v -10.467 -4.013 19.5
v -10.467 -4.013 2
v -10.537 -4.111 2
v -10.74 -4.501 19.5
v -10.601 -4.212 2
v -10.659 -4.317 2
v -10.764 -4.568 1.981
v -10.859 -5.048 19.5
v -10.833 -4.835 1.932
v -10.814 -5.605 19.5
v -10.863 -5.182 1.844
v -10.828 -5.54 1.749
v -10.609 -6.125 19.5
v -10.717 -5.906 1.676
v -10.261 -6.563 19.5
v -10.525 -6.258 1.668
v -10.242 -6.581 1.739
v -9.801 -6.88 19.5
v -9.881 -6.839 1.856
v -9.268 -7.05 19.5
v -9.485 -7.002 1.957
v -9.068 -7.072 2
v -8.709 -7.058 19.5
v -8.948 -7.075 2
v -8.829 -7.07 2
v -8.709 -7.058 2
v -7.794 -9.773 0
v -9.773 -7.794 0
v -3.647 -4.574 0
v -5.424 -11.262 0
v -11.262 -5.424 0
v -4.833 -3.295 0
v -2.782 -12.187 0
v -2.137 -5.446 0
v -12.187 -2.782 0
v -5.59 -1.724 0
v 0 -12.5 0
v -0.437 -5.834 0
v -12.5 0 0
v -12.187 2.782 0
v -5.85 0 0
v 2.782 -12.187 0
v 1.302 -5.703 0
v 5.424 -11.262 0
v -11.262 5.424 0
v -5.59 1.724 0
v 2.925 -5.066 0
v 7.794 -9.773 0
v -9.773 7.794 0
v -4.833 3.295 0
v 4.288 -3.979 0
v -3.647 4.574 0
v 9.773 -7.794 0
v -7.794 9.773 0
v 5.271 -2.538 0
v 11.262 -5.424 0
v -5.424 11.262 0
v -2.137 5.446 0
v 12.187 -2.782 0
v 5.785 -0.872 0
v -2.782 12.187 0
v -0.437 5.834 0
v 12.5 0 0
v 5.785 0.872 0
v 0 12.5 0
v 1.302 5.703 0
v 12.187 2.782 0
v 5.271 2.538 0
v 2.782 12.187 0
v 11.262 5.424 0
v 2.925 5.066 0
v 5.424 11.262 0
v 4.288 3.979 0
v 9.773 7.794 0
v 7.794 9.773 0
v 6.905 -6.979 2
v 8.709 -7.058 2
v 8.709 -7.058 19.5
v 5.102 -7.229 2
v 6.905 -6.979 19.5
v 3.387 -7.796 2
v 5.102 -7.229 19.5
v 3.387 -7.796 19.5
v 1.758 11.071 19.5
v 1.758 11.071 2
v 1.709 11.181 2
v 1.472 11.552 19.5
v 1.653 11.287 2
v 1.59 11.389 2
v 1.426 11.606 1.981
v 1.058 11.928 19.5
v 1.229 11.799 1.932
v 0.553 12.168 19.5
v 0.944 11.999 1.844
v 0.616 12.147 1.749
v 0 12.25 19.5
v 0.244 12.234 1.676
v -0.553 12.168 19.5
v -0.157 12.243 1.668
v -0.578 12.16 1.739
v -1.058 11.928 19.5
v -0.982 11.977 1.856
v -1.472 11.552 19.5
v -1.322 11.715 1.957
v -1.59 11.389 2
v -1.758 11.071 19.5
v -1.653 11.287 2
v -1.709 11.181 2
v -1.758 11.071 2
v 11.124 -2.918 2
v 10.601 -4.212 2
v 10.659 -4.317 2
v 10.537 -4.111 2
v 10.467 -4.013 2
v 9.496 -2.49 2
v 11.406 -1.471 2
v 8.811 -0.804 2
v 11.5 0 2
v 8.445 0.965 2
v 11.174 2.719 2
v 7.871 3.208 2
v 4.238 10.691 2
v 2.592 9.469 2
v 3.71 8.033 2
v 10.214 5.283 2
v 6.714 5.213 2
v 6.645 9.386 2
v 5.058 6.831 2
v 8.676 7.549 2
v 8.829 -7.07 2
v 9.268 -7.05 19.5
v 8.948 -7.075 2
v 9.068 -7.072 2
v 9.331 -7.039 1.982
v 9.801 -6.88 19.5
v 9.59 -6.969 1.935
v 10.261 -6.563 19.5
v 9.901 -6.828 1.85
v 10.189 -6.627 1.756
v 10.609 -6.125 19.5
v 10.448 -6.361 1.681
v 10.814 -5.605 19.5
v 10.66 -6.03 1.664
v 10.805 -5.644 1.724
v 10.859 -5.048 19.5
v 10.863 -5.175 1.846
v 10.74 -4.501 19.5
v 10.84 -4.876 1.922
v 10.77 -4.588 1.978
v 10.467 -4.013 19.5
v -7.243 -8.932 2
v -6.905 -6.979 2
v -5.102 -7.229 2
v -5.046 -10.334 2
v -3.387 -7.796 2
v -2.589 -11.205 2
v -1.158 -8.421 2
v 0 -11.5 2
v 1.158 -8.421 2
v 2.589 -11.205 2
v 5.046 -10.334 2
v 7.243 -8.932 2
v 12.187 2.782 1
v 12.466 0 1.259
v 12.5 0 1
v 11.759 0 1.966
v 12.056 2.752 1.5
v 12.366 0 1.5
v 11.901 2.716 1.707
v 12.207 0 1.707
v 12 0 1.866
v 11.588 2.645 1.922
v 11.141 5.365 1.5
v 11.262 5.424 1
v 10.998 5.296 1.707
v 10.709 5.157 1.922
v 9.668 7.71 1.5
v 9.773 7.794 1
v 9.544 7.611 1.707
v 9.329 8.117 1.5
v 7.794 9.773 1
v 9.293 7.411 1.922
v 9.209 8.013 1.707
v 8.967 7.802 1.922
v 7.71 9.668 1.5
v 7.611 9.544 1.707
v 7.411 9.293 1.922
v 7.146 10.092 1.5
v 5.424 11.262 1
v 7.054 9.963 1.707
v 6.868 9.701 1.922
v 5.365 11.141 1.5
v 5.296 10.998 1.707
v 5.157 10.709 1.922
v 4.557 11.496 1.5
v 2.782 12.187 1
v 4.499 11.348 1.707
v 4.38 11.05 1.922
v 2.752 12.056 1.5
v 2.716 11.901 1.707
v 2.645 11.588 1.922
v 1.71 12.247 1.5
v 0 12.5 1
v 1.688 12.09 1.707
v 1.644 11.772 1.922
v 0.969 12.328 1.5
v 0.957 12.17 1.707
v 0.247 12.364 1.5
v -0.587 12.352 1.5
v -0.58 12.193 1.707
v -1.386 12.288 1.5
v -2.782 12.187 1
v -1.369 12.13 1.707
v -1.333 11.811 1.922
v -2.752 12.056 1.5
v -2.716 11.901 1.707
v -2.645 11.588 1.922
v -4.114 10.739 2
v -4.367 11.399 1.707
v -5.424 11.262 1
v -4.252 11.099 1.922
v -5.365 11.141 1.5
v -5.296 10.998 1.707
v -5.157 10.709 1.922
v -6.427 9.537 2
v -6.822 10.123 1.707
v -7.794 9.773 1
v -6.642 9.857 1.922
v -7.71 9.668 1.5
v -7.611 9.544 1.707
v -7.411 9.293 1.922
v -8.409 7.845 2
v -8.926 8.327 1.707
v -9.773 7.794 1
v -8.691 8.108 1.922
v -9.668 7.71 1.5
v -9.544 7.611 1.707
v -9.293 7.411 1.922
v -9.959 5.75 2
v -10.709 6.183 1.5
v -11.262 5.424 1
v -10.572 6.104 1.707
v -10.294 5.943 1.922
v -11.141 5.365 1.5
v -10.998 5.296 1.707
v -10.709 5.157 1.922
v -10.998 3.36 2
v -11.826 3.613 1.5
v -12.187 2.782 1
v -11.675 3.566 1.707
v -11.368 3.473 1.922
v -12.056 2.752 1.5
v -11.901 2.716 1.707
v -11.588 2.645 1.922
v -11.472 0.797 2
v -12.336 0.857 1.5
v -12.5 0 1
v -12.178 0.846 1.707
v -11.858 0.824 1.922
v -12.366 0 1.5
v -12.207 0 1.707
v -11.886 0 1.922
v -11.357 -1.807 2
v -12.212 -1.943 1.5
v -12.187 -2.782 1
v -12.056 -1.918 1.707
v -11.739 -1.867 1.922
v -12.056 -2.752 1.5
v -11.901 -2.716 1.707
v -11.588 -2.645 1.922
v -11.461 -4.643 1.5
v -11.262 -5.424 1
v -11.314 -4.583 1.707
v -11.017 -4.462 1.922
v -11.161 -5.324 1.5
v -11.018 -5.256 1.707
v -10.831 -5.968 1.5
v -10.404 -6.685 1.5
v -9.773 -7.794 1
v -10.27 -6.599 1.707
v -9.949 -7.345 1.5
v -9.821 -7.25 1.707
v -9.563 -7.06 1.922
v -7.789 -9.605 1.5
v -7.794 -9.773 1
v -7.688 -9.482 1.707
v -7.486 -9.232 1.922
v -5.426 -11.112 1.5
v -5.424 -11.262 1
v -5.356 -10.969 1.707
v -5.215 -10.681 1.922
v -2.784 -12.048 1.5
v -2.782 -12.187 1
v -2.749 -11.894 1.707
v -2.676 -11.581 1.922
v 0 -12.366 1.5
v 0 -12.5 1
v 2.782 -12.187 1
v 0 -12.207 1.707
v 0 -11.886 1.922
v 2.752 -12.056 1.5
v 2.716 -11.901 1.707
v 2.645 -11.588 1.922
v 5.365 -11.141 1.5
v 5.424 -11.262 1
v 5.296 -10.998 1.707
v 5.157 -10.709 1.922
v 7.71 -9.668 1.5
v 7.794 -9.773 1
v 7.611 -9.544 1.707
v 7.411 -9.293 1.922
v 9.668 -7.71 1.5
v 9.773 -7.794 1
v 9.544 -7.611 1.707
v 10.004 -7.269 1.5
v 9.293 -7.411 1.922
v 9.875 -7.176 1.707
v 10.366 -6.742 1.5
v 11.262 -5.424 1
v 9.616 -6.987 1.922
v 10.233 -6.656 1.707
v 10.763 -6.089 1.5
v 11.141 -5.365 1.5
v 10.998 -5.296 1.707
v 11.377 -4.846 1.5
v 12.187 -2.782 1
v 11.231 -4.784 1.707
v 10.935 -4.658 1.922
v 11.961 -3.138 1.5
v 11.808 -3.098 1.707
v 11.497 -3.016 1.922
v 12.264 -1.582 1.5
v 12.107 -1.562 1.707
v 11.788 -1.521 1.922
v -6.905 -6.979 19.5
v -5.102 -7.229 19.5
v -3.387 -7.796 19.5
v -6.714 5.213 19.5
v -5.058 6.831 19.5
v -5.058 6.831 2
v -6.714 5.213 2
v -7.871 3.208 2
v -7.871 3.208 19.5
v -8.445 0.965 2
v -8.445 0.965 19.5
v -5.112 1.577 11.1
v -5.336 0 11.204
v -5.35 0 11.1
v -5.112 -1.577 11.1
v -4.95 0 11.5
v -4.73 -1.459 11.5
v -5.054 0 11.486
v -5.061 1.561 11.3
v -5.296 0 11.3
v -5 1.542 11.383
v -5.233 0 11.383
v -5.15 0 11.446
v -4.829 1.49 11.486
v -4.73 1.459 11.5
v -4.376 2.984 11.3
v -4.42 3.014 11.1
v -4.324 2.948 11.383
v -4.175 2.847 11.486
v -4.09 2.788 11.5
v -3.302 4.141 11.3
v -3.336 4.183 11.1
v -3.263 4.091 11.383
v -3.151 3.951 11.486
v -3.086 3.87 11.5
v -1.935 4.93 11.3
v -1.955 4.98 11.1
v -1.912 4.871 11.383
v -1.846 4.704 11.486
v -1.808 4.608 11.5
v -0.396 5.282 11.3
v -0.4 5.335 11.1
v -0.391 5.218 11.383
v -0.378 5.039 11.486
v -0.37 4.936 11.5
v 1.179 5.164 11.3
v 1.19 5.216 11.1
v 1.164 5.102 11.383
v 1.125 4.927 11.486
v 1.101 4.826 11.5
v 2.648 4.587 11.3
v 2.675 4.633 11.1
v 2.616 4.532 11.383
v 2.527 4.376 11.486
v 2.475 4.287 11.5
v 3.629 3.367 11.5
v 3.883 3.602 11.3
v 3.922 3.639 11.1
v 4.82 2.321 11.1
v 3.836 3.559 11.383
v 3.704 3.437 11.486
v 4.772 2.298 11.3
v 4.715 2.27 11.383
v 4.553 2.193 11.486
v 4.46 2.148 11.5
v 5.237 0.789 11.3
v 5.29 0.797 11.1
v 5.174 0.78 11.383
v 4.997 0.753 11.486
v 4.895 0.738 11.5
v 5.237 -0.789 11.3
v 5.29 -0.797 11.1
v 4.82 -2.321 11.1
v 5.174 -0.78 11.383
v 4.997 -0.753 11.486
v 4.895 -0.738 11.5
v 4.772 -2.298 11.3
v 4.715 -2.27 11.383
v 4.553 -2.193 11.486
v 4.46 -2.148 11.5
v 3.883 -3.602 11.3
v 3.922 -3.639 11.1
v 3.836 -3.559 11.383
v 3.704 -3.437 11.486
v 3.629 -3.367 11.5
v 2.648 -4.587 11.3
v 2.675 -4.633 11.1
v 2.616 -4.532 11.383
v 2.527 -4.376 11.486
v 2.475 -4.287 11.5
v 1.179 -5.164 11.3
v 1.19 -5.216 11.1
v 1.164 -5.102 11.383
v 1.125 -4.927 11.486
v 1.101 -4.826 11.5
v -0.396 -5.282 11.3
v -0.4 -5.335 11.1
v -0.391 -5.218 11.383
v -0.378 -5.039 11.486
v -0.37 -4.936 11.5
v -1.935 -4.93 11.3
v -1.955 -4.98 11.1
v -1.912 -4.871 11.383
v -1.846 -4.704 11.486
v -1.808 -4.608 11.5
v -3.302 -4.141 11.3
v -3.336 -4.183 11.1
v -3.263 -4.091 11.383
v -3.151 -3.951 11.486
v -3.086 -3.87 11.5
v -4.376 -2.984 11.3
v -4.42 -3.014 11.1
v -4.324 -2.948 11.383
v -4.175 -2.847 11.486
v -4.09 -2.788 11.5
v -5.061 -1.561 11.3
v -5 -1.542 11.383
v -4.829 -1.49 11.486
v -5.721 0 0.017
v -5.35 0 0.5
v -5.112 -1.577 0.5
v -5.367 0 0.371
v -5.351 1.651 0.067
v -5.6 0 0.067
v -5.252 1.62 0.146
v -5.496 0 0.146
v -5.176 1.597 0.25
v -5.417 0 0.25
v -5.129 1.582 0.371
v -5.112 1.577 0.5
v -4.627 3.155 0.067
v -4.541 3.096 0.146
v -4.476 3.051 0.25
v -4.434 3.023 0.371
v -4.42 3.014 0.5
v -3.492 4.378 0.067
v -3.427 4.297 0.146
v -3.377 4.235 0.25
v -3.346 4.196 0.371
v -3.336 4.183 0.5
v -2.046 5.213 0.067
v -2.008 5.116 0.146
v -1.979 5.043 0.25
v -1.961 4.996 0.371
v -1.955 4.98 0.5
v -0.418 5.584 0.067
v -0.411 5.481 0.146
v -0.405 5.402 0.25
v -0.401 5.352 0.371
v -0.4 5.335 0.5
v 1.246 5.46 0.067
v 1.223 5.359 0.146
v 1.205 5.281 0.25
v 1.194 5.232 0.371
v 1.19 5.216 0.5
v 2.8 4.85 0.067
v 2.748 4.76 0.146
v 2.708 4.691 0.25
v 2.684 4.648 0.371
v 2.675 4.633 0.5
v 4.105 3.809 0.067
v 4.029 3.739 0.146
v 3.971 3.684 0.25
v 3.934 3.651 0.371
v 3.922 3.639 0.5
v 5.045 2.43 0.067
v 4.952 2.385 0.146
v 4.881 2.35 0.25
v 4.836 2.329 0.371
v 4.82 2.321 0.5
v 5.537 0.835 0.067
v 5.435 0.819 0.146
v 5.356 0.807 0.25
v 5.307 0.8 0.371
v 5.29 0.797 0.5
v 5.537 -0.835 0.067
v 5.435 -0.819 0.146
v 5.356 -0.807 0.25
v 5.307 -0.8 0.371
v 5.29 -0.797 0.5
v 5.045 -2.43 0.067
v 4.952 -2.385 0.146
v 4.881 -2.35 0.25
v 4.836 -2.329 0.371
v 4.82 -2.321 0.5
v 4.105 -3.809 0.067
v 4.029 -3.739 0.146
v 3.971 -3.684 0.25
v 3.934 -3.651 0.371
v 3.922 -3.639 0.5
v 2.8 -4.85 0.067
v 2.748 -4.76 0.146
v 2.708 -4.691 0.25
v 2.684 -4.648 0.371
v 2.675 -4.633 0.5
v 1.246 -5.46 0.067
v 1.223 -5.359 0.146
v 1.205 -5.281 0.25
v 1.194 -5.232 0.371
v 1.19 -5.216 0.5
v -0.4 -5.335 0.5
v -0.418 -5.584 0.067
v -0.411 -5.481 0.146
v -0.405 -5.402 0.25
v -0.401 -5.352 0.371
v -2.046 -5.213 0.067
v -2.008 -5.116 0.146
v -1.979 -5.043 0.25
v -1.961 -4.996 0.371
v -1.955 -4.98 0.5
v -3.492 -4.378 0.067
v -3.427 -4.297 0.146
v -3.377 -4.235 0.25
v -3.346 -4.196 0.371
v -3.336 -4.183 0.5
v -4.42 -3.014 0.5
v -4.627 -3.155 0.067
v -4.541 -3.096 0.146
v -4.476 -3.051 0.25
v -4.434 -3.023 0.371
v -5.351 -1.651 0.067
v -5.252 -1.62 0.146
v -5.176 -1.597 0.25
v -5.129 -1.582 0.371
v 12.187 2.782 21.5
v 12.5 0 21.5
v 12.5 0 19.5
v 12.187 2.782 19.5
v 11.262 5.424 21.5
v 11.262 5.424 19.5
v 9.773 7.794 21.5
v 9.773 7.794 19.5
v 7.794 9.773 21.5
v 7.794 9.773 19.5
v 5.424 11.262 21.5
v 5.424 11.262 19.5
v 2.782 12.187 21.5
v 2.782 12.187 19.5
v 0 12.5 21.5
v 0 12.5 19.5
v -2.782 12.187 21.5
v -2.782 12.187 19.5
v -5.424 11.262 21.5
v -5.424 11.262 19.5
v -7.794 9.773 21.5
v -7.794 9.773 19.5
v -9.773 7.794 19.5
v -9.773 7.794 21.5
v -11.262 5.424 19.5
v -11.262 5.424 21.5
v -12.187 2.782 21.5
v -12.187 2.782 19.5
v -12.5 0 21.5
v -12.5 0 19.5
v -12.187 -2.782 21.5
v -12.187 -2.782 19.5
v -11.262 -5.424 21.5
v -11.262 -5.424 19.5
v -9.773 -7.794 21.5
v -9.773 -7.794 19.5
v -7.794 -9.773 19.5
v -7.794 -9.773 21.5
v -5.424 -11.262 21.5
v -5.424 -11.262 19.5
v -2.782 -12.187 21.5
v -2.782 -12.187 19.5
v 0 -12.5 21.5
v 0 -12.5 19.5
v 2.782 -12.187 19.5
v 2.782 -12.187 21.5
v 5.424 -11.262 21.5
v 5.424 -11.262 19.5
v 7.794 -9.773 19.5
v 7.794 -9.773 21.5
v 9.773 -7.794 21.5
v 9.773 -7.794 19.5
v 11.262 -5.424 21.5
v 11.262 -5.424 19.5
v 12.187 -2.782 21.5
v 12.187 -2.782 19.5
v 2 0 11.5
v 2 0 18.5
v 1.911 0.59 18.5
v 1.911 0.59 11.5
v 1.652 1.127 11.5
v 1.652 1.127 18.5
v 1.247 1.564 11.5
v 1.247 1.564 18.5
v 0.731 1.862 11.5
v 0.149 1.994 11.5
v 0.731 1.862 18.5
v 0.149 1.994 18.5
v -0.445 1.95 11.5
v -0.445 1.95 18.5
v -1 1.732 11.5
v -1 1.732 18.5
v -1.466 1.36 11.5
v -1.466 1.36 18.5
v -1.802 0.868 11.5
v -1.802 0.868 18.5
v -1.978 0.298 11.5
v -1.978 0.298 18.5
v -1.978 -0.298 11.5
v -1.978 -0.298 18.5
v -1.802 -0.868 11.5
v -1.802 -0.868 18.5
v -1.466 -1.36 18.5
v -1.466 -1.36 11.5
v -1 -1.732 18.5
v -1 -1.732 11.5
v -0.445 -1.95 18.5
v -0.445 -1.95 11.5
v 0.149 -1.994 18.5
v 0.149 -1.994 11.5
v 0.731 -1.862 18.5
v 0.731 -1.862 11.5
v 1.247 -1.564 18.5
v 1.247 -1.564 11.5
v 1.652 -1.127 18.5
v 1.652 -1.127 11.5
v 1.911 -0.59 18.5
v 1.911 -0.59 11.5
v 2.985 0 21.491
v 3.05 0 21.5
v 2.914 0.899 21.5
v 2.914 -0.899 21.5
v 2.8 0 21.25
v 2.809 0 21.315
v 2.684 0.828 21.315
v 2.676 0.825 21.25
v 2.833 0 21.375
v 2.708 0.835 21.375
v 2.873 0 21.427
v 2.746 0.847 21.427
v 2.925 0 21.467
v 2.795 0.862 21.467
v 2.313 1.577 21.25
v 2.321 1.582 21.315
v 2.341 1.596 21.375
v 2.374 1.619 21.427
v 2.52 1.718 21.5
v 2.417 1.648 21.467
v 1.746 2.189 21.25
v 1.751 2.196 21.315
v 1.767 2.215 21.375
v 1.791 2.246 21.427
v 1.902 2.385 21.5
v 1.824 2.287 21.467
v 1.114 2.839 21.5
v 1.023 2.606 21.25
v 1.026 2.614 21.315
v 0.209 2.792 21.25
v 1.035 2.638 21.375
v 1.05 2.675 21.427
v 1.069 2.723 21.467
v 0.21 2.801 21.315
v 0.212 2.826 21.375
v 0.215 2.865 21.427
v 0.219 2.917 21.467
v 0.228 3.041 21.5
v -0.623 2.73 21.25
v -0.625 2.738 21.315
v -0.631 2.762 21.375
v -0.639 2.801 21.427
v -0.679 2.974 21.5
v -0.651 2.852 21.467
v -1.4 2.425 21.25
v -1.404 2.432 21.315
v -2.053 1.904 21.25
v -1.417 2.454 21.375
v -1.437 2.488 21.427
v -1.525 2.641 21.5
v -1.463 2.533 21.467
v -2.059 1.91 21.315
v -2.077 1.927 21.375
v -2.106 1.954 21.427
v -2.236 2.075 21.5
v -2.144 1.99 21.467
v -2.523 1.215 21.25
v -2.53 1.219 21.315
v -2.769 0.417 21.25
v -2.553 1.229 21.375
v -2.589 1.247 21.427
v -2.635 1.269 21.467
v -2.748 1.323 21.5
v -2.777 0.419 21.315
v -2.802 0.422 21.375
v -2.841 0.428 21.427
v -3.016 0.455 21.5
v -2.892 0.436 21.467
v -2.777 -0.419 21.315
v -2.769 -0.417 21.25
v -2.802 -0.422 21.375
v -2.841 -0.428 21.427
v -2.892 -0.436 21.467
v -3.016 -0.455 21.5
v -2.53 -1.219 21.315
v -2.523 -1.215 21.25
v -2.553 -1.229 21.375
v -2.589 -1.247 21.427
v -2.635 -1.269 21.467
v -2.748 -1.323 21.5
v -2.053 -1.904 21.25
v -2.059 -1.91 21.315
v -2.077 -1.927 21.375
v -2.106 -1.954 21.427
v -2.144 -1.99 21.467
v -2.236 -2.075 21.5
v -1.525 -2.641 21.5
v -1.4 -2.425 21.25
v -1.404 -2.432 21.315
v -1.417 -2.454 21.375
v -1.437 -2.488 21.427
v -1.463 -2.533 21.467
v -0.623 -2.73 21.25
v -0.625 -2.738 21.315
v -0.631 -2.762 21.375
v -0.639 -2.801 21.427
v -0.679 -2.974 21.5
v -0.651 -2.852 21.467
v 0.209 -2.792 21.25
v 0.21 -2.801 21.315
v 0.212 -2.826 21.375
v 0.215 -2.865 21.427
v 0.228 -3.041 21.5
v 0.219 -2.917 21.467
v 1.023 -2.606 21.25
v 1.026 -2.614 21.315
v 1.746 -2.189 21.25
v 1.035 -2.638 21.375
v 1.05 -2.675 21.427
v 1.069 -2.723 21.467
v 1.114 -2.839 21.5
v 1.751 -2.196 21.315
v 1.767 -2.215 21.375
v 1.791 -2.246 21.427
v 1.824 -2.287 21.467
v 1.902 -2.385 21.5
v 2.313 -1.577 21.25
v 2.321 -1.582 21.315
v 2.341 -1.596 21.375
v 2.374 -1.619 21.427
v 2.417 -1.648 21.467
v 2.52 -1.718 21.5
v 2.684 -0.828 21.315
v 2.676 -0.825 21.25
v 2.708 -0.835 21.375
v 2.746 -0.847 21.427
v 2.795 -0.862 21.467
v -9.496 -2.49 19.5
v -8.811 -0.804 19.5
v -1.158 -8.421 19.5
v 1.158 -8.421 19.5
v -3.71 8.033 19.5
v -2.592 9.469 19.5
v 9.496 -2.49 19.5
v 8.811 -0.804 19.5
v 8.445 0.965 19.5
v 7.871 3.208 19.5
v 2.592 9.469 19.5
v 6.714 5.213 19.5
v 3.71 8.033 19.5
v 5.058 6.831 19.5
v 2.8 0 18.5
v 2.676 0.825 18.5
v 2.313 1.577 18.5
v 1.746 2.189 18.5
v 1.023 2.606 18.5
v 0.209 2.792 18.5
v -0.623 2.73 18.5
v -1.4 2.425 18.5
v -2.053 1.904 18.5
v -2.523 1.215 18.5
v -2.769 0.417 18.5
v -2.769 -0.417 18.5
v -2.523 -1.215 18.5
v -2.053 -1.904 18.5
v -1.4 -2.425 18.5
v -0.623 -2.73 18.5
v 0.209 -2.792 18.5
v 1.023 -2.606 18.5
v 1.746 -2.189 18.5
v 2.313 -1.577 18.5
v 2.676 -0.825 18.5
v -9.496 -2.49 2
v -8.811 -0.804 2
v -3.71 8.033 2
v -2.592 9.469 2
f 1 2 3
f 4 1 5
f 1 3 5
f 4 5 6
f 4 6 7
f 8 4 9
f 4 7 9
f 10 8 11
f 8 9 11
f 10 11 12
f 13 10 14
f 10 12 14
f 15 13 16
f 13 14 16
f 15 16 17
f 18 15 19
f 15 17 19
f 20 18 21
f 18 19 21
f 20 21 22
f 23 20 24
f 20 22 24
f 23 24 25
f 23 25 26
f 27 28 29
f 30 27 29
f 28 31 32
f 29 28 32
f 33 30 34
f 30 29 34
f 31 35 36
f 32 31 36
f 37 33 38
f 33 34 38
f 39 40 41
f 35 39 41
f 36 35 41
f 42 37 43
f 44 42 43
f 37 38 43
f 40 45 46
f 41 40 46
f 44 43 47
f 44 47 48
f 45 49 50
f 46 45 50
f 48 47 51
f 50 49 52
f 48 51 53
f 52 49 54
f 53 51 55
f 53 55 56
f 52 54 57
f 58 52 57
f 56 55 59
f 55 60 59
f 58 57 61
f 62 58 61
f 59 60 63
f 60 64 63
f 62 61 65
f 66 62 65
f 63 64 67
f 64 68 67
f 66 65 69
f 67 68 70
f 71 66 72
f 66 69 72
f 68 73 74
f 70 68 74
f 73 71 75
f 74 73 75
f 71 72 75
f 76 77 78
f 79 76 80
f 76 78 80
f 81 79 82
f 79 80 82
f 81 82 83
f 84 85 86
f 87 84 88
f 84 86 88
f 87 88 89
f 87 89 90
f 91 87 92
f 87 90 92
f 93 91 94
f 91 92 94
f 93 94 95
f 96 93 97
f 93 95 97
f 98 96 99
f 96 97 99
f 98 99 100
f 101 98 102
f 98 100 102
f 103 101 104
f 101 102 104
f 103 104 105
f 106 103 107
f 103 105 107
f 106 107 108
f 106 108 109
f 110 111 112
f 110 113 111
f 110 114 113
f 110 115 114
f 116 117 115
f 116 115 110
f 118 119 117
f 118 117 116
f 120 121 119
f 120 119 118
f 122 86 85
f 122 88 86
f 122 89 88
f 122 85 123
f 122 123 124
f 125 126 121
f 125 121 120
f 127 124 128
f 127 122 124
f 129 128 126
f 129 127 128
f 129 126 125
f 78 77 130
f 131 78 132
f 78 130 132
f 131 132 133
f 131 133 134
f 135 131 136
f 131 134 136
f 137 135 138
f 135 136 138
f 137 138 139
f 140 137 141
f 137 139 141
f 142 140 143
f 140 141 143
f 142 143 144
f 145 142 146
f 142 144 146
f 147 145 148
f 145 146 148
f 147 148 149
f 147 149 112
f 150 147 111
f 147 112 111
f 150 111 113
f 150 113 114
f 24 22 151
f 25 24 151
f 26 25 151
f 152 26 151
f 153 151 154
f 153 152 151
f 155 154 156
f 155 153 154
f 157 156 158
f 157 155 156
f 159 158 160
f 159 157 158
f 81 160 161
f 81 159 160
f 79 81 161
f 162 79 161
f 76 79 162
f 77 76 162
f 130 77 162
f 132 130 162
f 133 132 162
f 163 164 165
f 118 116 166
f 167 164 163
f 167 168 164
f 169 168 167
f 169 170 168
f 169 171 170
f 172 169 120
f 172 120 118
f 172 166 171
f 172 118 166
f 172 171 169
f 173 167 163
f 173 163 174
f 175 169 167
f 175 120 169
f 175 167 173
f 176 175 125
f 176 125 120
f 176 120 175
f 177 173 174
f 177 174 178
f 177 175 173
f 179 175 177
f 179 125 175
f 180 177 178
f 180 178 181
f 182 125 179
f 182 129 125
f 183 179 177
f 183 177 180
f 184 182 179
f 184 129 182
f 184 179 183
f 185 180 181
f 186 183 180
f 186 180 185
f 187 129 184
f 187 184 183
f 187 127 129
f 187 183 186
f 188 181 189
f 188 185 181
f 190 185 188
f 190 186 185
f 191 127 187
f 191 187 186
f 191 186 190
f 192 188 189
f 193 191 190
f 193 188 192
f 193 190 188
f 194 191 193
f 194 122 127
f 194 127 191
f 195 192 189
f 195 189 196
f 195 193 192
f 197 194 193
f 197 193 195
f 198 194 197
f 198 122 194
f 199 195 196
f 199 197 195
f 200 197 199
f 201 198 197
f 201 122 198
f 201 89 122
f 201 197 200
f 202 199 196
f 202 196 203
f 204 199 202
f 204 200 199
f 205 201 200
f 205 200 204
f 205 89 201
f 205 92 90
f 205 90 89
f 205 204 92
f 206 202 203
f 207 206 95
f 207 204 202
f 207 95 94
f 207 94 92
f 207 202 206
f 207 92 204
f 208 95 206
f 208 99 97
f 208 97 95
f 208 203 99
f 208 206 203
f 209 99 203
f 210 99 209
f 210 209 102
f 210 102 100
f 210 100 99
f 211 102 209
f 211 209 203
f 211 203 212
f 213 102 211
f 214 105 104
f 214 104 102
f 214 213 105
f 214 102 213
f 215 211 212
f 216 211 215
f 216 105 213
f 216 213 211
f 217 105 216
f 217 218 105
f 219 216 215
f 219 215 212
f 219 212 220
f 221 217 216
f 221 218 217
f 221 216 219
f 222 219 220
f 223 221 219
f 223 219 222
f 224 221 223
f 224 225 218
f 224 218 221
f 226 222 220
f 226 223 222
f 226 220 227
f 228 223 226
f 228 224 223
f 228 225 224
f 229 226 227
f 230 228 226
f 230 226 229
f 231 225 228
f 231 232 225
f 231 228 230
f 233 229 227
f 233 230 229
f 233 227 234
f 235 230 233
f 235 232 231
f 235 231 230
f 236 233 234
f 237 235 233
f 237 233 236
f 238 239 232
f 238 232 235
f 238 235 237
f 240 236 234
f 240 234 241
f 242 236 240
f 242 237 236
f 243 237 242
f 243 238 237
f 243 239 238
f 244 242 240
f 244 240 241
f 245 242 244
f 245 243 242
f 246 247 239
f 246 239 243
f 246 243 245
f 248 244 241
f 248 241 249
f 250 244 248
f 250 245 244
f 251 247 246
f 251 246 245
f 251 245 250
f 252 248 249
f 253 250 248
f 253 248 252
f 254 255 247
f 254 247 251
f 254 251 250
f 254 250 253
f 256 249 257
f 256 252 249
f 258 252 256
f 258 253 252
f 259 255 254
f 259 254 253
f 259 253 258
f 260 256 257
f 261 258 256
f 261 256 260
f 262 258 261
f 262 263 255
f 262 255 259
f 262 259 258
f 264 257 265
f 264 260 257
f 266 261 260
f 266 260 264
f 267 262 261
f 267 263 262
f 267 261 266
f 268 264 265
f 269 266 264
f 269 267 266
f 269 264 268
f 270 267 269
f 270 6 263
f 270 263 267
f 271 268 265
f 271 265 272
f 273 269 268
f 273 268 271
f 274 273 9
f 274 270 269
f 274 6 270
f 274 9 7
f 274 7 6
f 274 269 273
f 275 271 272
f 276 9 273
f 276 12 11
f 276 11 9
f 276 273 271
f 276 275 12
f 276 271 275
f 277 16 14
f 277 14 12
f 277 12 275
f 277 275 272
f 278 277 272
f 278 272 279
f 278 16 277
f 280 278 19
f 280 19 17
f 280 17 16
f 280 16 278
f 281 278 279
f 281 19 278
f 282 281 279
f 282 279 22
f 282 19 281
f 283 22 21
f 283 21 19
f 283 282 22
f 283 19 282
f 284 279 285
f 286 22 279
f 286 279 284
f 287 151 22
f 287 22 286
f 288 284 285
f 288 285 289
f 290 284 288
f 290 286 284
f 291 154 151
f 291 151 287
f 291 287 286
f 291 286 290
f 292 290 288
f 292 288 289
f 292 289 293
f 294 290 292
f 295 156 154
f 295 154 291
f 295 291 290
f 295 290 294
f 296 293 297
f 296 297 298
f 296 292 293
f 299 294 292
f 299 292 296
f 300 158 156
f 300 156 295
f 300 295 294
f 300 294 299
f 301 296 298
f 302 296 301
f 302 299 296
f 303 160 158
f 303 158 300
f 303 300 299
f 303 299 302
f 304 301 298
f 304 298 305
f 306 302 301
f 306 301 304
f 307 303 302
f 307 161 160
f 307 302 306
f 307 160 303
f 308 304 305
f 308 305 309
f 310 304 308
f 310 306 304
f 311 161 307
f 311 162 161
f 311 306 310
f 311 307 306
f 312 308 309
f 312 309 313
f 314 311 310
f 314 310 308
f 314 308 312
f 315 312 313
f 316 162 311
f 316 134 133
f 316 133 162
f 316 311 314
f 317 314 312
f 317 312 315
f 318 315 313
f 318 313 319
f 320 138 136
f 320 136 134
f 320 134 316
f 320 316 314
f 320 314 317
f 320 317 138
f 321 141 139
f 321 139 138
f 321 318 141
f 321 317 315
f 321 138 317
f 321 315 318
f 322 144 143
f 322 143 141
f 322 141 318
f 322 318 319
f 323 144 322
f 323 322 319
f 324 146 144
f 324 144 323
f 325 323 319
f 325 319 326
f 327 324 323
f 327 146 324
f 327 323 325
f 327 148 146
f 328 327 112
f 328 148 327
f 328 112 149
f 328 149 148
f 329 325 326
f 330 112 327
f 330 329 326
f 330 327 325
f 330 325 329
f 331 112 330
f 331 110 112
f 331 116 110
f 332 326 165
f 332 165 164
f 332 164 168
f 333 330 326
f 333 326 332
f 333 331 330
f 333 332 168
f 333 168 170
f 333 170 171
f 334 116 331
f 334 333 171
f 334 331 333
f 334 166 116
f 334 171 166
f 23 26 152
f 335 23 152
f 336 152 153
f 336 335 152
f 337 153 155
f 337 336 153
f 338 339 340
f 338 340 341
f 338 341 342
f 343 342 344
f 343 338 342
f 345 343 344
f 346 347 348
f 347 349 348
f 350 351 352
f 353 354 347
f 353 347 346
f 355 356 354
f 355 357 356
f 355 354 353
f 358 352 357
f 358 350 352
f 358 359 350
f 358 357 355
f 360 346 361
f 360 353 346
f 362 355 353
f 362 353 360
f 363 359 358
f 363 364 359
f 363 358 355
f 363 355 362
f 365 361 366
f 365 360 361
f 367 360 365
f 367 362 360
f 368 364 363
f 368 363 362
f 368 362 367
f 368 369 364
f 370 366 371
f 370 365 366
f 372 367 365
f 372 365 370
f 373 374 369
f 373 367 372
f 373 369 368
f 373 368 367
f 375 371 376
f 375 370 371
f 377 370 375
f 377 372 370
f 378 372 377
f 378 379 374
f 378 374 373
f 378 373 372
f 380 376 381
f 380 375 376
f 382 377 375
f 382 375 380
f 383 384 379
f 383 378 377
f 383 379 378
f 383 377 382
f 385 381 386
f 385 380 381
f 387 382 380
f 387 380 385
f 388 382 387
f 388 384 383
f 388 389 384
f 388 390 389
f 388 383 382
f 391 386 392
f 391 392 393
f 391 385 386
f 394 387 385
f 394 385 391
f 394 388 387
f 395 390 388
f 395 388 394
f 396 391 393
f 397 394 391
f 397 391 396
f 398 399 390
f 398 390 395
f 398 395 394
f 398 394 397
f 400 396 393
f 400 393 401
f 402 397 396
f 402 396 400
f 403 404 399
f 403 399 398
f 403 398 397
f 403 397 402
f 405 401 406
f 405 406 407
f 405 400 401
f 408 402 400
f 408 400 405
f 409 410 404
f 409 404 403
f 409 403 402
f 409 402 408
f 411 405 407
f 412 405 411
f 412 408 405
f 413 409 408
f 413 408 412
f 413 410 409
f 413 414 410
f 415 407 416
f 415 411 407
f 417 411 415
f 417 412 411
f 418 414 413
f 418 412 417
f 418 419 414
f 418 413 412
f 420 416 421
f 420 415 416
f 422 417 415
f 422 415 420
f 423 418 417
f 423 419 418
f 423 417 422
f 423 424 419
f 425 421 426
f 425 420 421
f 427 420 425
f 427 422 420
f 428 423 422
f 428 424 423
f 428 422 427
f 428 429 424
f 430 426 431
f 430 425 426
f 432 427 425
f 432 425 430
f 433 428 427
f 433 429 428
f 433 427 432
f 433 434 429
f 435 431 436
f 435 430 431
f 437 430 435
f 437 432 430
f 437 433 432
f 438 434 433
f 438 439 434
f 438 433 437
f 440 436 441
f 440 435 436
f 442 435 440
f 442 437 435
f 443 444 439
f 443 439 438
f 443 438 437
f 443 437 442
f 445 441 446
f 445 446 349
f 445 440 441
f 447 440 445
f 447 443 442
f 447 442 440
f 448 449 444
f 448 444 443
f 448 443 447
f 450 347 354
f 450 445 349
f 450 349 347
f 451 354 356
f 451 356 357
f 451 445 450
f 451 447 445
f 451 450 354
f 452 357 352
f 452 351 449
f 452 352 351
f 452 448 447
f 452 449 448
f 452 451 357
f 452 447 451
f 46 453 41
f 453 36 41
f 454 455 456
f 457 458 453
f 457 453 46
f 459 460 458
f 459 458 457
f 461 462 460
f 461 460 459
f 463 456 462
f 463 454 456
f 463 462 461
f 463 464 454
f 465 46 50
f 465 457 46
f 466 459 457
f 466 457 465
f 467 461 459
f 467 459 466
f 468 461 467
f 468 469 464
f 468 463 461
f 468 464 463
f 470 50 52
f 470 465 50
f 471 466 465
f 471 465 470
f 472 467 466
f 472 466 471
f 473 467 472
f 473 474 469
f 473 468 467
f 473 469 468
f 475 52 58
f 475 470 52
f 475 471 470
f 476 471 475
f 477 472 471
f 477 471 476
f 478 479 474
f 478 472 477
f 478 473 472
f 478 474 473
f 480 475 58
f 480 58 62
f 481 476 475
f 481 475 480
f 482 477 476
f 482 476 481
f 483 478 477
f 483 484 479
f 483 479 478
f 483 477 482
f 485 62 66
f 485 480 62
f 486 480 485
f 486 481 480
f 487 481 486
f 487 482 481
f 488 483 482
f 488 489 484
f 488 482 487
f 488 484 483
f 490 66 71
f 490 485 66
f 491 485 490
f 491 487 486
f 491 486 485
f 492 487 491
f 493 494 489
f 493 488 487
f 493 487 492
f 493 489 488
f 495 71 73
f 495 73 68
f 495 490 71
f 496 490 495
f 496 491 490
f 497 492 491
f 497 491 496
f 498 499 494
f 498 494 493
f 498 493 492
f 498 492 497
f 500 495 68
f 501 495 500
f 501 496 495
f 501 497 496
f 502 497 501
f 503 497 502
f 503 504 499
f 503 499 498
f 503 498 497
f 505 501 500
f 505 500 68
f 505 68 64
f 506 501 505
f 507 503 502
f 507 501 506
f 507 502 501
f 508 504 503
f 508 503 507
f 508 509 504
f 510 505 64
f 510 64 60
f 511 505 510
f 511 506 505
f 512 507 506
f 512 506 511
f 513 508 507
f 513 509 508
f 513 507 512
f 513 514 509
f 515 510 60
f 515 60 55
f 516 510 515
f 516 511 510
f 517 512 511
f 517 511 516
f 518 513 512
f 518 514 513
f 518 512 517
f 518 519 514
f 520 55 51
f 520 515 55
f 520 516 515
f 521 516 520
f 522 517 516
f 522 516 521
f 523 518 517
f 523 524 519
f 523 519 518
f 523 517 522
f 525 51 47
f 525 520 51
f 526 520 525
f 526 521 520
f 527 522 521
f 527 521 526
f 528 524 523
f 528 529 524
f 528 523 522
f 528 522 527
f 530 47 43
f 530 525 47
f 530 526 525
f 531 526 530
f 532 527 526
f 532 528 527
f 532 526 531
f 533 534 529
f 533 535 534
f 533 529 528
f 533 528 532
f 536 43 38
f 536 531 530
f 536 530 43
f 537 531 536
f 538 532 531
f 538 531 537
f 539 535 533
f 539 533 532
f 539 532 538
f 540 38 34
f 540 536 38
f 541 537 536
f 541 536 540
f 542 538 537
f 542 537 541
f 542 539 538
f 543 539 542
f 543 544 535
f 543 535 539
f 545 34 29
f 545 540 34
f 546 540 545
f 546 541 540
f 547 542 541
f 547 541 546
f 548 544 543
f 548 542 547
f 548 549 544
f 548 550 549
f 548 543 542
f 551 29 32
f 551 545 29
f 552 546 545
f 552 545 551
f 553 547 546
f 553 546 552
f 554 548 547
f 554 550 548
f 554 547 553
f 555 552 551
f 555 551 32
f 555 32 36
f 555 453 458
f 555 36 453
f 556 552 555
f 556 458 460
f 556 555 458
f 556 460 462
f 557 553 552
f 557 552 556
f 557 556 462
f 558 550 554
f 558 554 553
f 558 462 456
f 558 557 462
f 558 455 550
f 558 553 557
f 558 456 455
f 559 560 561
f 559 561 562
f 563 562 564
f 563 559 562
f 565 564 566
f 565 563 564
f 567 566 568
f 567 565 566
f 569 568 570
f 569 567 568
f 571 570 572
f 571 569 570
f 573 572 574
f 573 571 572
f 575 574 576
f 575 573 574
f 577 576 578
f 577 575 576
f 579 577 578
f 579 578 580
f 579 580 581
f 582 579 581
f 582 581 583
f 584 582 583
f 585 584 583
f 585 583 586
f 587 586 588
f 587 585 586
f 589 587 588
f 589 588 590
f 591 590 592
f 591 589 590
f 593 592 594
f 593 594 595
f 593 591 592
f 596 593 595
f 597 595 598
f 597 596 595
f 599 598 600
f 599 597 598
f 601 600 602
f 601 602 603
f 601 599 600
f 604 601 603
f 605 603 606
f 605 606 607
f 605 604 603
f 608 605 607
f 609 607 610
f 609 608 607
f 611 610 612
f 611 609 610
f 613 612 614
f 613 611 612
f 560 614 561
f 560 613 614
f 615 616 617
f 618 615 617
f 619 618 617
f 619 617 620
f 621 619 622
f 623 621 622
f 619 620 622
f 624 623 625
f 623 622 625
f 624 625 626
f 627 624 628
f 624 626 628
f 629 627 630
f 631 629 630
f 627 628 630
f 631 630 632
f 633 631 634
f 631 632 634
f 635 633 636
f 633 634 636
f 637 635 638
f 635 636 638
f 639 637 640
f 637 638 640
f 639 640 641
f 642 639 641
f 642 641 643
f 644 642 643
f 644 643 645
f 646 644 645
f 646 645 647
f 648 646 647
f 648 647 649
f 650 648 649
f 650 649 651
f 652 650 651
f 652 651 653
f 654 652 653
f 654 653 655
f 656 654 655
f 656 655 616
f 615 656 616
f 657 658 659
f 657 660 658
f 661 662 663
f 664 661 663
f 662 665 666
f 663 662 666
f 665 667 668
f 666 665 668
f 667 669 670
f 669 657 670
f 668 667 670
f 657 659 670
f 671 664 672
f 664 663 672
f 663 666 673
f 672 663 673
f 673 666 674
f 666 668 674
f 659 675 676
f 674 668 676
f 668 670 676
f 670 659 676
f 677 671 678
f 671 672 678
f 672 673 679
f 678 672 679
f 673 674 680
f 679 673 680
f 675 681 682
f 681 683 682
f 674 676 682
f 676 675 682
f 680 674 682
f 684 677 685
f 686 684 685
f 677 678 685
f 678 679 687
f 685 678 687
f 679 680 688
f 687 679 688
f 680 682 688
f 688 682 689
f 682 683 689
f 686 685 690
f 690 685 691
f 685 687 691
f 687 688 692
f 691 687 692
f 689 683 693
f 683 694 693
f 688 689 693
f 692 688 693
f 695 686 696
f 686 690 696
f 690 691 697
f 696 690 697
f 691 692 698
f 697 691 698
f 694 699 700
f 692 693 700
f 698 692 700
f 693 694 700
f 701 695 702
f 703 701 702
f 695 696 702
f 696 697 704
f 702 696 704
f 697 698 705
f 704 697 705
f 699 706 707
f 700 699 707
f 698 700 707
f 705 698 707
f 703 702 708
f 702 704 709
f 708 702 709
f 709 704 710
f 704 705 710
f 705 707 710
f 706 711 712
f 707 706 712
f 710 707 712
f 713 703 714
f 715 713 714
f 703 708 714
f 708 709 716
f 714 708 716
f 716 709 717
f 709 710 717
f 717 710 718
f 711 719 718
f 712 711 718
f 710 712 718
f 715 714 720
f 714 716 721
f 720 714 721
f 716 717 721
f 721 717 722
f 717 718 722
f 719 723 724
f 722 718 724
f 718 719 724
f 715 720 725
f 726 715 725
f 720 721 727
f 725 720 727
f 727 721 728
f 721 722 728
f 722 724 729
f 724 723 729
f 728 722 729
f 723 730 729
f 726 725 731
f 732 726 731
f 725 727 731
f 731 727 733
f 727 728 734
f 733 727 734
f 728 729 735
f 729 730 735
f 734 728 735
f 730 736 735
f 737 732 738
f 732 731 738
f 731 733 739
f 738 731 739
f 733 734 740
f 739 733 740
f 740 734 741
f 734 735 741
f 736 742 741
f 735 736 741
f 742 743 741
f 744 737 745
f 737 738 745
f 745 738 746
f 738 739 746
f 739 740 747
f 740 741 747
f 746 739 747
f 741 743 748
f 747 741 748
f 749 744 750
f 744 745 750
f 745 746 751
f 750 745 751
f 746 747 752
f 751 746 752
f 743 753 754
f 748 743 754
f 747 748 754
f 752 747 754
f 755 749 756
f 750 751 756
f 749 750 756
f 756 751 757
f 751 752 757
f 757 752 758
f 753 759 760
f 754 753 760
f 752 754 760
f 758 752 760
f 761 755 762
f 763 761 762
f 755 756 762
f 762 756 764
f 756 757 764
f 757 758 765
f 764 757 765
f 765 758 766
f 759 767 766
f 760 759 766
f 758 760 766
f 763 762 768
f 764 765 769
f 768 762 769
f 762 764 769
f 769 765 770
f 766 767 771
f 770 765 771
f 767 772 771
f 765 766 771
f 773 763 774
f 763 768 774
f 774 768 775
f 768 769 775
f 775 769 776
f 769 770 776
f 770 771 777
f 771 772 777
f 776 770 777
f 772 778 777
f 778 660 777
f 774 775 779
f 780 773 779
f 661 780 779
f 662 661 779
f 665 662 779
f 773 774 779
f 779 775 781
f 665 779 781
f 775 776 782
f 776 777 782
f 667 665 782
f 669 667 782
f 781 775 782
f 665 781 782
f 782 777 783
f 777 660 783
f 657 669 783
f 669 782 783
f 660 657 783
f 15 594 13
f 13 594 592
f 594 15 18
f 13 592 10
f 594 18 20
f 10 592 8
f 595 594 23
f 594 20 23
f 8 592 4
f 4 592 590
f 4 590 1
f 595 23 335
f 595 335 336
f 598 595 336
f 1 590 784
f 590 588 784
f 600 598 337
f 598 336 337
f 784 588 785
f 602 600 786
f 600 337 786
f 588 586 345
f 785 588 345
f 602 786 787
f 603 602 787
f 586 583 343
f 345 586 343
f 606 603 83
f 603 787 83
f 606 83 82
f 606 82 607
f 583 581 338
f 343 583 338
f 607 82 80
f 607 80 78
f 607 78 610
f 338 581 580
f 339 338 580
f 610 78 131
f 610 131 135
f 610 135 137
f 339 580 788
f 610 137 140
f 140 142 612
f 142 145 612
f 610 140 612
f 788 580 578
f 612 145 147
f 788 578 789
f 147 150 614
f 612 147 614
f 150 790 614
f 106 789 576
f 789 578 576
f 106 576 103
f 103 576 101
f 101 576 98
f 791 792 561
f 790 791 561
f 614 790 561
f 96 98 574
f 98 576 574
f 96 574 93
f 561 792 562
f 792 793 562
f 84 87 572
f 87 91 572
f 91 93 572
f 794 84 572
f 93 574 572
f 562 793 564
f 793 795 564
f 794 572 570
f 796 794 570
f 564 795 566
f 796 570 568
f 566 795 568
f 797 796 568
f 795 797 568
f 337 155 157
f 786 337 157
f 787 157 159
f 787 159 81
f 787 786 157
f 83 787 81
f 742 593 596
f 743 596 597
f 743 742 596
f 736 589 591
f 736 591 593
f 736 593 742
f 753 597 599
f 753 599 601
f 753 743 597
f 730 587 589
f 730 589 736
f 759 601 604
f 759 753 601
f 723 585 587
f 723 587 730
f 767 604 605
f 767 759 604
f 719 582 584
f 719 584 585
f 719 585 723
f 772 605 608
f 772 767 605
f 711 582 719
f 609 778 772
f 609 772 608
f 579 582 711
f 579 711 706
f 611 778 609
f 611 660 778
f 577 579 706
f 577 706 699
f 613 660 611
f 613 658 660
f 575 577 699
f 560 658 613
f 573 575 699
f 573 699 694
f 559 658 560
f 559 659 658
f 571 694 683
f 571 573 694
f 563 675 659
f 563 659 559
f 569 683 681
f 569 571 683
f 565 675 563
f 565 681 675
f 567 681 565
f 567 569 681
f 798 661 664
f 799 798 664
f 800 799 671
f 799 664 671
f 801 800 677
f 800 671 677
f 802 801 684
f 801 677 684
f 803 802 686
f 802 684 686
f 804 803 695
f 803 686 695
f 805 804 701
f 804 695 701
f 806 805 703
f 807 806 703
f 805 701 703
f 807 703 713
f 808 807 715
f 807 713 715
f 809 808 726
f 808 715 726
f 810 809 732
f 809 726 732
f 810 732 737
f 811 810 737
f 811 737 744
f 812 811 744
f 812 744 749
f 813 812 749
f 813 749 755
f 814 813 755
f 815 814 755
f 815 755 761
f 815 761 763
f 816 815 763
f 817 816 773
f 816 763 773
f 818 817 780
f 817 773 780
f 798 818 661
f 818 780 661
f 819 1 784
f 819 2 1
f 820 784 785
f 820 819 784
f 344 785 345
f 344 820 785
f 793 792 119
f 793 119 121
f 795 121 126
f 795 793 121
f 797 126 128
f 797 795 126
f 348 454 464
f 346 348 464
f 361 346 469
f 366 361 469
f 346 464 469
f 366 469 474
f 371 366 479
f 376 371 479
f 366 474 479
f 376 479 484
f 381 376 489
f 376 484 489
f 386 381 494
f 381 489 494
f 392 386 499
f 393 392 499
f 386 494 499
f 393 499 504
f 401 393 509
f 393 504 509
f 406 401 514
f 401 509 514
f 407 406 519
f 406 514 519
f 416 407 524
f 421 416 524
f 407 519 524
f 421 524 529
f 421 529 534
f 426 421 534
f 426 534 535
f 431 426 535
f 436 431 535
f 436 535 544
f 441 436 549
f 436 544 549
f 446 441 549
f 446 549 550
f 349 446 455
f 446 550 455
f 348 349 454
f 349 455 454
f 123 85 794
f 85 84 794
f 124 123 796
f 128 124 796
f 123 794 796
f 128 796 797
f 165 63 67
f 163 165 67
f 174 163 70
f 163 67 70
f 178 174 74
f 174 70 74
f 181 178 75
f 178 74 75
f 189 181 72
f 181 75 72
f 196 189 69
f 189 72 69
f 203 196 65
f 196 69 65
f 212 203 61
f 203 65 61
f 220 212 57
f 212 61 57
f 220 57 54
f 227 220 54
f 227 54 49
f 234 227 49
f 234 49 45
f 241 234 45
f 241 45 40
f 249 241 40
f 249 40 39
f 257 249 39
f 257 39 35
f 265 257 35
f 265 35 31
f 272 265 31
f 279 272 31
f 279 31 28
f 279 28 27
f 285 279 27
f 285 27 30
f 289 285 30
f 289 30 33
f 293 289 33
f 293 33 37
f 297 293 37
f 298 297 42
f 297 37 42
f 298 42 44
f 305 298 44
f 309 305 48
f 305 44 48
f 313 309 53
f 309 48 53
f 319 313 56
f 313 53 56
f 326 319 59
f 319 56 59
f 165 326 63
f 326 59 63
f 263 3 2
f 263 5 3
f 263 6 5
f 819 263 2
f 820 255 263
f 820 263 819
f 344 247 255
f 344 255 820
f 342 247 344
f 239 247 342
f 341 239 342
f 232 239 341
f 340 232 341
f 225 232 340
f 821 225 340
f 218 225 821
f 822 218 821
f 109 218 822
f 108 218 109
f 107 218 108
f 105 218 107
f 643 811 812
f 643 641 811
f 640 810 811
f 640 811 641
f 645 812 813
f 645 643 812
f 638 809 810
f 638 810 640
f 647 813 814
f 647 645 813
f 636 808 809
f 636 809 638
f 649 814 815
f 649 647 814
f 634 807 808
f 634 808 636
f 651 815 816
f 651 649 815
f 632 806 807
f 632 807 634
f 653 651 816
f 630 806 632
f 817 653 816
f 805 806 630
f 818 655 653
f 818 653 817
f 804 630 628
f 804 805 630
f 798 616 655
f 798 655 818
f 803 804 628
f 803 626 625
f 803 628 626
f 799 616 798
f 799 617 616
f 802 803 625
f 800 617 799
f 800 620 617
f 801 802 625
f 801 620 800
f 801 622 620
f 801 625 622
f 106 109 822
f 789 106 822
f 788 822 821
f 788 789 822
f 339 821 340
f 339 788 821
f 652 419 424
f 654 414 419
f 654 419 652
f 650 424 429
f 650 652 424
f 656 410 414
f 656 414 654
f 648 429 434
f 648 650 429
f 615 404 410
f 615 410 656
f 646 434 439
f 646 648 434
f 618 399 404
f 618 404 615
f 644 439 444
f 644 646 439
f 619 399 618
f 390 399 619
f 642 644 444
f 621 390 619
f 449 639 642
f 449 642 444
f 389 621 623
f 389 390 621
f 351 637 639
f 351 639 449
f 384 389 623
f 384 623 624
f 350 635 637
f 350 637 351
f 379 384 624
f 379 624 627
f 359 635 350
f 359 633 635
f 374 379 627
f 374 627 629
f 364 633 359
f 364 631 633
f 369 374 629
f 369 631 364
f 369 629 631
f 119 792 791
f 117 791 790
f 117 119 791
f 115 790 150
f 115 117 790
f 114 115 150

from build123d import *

# Parameters (mm, degrees)
SKETCH1_R           = 12.5
BOSS_EXTRUDE1_DEPTH = 2
SKETCH2_R           = 1.9
BOSS_EXTRUDE2_DEPTH = 17.5
SKETCH3_R           = 8.5
BOSS_EXTRUDE3_DEPTH = 8.75
SKETCH4_R           = 2
CUT_EXTRUDE1_DEPTH  = 28.834331319
SKETCH5_R           = 5.35
CUT_EXTRUDE2_DEPTH  = 11.5
FILLET1_R           = 0.5
SKETCH6_R           = 2.8
CUT_EXTRUDE3_DEPTH  = 3
FILLET2_R           = 0.25
FILLET3_R           = 10
FILLET4_R           = 10
FILLET5_R           = 10
FILLET6_R           = 10
FILLET7_R           = 10
FILLET8_R           = 10
FILLET9_R           = 1
FILLET10_R          = 0.4


with BuildPart() as part:
    # Sketch1 → Boss-Extrude1 (new body)
    with BuildSketch(Plane(origin=(0, 0, 0), x_dir=(0, 1, 0), z_dir=(0, 0, 1))):
        with Locations(Location((0, 0, 0), (0, 0, 270))):
            Circle(SKETCH1_R)
    boss_extrude1 = extrude(amount=BOSS_EXTRUDE1_DEPTH)

    # Sketch2 → Boss-Extrude2 (add)
    with BuildSketch(Plane.XY.offset(2)):
        with Locations((0, 10.35)):
            Circle(SKETCH2_R)
        with Locations((8.963362929, -5.175)):
            Circle(SKETCH2_R)
        with Locations((-8.963362929, -5.175)):
            Circle(SKETCH2_R)
    extrude(amount=BOSS_EXTRUDE2_DEPTH)

    # Sketch3 → Boss-Extrude3 (add)
    with BuildSketch(Plane.XY.offset(2)):
        Circle(SKETCH3_R)
    boss_extrude3 = extrude(amount=BOSS_EXTRUDE3_DEPTH)

    # Mirror2: Boss-Extrude1, Boss-Extrude3 across plane
    add(boss_extrude1.mirror(Plane.XY.offset(10.75)))
    add(boss_extrude3.mirror(Plane.XY.offset(10.75)))

    # Sketch4 → Cut-Extrude1 (cut, through all)
    with BuildSketch(Plane.XY.offset(21.5)):
        Circle(SKETCH4_R)
    extrude(amount=-CUT_EXTRUDE1_DEPTH, mode=Mode.SUBTRACT)

    # Sketch5 → Cut-Extrude2 (cut)
    with BuildSketch(Plane(origin=(0, 0, 0), x_dir=(1, 0, 0), z_dir=(0, 0, -1))):
        with Locations(Location((0, 0, 0), (0, 0, 180))):
            Circle(SKETCH5_R)
    extrude(amount=-CUT_EXTRUDE2_DEPTH, mode=Mode.SUBTRACT)

    # Fillet1
    fillet1_edges = [part.edges().sort_by_distance(p)[0] for p in [
        (5.35, 0, 0),
    ]]
    fillet(fillet1_edges, radius=FILLET1_R)

    # Sketch6 → Cut-Extrude3 (cut)
    with BuildSketch(Plane.XY.offset(21.5)):
        Circle(SKETCH6_R)
    extrude(amount=-CUT_EXTRUDE3_DEPTH, mode=Mode.SUBTRACT)

    # Fillet2
    fillet2_edges = [part.edges().sort_by_distance(p)[0] for p in [
        (-2.8, 0, 21.5),
    ]]
    fillet(fillet2_edges, radius=FILLET2_R)

    # Fillet3
    fillet3_edges = [part.edges().sort_by_distance(p)[0] for p in [
        (-7.549524157, -3.905724645, 10.75),
    ]]
    fillet(fillet3_edges, radius=FILLET3_R)

    # Fillet4
    fillet4_edges = [part.edges().sort_by_distance(p)[0] for p in [
        (-7.157218842, -4.585217384, 10.75),
    ]]
    fillet(fillet4_edges, radius=FILLET4_R)

    # Fillet5
    fillet5_edges = [part.edges().sort_by_distance(p)[0] for p in [
        (0.392305315, 8.490942029, 10.75),
    ]]
    fillet(fillet5_edges, radius=FILLET5_R)

    # Fillet6
    fillet6_edges = [part.edges().sort_by_distance(p)[0] for p in [
        (-0.392305315, 8.490942029, 10.75),
    ]]
    fillet(fillet6_edges, radius=FILLET6_R)

    # Fillet7
    fillet7_edges = [part.edges().sort_by_distance(p)[0] for p in [
        (7.549524157, -3.905724645, 10.75),
    ]]
    fillet(fillet7_edges, radius=FILLET7_R)

    # Fillet8
    fillet8_edges = [part.edges().sort_by_distance(p)[0] for p in [
        (7.157218842, -4.585217384, 10.75),
    ]]
    fillet(fillet8_edges, radius=FILLET8_R)

    # Fillet9
    # the kernel refuses this fillet: 1 mm, written as the material it takes off along each edge
    with BuildSketch(Plane(origin=(0, 0, 2), x_dir=(1, 0, 0), z_dir=(0, -1, 0))) as fillet9_piece_1_section:
        with BuildLine():
            CenterArc((12.5 - FILLET9_R, -FILLET9_R), FILLET9_R, 0, 90)
            Line((12.5, -FILLET9_R), (12.5, 0))
            Line((12.5, 0), (12.5 - FILLET9_R, 0))
        make_face()
    fillet9_piece_1 = revolve(axis=Axis((0, 0, 2), (0, 0, 1)), mode=Mode.PRIVATE)
    fillet9_piece_1 = fillet9_piece_1 - Plane(origin=(8.963362929, -5.175, 1.726039761), x_dir=(1, 0, 0), z_dir=(0, 0, -1)) * Cylinder(1.9, 51, mode=Mode.PRIVATE)
    fillet9_piece_1 = fillet9_piece_1 - Plane(origin=(-8.963362929, -5.175, 1.726039761), x_dir=(1, 0, 0), z_dir=(0, 0, -1)) * Cylinder(1.9, 51, mode=Mode.PRIVATE)
    fillet9_piece_1 = fillet9_piece_1 - Plane(origin=(0, 10.35, 1.726039761), x_dir=(1, 0, 0), z_dir=(0, 0, -1)) * Cylinder(1.9, 51, mode=Mode.PRIVATE)
    add(fillet9_piece_1, mode=Mode.SUBTRACT)

    # Fillet10
    fillet10_edges = [part.edges().sort_by_distance(p)[0] for p in [
        (5.35, 0, 11.5),
    ]]
    fillet(fillet10_edges, radius=FILLET10_R)


solid = part.part
